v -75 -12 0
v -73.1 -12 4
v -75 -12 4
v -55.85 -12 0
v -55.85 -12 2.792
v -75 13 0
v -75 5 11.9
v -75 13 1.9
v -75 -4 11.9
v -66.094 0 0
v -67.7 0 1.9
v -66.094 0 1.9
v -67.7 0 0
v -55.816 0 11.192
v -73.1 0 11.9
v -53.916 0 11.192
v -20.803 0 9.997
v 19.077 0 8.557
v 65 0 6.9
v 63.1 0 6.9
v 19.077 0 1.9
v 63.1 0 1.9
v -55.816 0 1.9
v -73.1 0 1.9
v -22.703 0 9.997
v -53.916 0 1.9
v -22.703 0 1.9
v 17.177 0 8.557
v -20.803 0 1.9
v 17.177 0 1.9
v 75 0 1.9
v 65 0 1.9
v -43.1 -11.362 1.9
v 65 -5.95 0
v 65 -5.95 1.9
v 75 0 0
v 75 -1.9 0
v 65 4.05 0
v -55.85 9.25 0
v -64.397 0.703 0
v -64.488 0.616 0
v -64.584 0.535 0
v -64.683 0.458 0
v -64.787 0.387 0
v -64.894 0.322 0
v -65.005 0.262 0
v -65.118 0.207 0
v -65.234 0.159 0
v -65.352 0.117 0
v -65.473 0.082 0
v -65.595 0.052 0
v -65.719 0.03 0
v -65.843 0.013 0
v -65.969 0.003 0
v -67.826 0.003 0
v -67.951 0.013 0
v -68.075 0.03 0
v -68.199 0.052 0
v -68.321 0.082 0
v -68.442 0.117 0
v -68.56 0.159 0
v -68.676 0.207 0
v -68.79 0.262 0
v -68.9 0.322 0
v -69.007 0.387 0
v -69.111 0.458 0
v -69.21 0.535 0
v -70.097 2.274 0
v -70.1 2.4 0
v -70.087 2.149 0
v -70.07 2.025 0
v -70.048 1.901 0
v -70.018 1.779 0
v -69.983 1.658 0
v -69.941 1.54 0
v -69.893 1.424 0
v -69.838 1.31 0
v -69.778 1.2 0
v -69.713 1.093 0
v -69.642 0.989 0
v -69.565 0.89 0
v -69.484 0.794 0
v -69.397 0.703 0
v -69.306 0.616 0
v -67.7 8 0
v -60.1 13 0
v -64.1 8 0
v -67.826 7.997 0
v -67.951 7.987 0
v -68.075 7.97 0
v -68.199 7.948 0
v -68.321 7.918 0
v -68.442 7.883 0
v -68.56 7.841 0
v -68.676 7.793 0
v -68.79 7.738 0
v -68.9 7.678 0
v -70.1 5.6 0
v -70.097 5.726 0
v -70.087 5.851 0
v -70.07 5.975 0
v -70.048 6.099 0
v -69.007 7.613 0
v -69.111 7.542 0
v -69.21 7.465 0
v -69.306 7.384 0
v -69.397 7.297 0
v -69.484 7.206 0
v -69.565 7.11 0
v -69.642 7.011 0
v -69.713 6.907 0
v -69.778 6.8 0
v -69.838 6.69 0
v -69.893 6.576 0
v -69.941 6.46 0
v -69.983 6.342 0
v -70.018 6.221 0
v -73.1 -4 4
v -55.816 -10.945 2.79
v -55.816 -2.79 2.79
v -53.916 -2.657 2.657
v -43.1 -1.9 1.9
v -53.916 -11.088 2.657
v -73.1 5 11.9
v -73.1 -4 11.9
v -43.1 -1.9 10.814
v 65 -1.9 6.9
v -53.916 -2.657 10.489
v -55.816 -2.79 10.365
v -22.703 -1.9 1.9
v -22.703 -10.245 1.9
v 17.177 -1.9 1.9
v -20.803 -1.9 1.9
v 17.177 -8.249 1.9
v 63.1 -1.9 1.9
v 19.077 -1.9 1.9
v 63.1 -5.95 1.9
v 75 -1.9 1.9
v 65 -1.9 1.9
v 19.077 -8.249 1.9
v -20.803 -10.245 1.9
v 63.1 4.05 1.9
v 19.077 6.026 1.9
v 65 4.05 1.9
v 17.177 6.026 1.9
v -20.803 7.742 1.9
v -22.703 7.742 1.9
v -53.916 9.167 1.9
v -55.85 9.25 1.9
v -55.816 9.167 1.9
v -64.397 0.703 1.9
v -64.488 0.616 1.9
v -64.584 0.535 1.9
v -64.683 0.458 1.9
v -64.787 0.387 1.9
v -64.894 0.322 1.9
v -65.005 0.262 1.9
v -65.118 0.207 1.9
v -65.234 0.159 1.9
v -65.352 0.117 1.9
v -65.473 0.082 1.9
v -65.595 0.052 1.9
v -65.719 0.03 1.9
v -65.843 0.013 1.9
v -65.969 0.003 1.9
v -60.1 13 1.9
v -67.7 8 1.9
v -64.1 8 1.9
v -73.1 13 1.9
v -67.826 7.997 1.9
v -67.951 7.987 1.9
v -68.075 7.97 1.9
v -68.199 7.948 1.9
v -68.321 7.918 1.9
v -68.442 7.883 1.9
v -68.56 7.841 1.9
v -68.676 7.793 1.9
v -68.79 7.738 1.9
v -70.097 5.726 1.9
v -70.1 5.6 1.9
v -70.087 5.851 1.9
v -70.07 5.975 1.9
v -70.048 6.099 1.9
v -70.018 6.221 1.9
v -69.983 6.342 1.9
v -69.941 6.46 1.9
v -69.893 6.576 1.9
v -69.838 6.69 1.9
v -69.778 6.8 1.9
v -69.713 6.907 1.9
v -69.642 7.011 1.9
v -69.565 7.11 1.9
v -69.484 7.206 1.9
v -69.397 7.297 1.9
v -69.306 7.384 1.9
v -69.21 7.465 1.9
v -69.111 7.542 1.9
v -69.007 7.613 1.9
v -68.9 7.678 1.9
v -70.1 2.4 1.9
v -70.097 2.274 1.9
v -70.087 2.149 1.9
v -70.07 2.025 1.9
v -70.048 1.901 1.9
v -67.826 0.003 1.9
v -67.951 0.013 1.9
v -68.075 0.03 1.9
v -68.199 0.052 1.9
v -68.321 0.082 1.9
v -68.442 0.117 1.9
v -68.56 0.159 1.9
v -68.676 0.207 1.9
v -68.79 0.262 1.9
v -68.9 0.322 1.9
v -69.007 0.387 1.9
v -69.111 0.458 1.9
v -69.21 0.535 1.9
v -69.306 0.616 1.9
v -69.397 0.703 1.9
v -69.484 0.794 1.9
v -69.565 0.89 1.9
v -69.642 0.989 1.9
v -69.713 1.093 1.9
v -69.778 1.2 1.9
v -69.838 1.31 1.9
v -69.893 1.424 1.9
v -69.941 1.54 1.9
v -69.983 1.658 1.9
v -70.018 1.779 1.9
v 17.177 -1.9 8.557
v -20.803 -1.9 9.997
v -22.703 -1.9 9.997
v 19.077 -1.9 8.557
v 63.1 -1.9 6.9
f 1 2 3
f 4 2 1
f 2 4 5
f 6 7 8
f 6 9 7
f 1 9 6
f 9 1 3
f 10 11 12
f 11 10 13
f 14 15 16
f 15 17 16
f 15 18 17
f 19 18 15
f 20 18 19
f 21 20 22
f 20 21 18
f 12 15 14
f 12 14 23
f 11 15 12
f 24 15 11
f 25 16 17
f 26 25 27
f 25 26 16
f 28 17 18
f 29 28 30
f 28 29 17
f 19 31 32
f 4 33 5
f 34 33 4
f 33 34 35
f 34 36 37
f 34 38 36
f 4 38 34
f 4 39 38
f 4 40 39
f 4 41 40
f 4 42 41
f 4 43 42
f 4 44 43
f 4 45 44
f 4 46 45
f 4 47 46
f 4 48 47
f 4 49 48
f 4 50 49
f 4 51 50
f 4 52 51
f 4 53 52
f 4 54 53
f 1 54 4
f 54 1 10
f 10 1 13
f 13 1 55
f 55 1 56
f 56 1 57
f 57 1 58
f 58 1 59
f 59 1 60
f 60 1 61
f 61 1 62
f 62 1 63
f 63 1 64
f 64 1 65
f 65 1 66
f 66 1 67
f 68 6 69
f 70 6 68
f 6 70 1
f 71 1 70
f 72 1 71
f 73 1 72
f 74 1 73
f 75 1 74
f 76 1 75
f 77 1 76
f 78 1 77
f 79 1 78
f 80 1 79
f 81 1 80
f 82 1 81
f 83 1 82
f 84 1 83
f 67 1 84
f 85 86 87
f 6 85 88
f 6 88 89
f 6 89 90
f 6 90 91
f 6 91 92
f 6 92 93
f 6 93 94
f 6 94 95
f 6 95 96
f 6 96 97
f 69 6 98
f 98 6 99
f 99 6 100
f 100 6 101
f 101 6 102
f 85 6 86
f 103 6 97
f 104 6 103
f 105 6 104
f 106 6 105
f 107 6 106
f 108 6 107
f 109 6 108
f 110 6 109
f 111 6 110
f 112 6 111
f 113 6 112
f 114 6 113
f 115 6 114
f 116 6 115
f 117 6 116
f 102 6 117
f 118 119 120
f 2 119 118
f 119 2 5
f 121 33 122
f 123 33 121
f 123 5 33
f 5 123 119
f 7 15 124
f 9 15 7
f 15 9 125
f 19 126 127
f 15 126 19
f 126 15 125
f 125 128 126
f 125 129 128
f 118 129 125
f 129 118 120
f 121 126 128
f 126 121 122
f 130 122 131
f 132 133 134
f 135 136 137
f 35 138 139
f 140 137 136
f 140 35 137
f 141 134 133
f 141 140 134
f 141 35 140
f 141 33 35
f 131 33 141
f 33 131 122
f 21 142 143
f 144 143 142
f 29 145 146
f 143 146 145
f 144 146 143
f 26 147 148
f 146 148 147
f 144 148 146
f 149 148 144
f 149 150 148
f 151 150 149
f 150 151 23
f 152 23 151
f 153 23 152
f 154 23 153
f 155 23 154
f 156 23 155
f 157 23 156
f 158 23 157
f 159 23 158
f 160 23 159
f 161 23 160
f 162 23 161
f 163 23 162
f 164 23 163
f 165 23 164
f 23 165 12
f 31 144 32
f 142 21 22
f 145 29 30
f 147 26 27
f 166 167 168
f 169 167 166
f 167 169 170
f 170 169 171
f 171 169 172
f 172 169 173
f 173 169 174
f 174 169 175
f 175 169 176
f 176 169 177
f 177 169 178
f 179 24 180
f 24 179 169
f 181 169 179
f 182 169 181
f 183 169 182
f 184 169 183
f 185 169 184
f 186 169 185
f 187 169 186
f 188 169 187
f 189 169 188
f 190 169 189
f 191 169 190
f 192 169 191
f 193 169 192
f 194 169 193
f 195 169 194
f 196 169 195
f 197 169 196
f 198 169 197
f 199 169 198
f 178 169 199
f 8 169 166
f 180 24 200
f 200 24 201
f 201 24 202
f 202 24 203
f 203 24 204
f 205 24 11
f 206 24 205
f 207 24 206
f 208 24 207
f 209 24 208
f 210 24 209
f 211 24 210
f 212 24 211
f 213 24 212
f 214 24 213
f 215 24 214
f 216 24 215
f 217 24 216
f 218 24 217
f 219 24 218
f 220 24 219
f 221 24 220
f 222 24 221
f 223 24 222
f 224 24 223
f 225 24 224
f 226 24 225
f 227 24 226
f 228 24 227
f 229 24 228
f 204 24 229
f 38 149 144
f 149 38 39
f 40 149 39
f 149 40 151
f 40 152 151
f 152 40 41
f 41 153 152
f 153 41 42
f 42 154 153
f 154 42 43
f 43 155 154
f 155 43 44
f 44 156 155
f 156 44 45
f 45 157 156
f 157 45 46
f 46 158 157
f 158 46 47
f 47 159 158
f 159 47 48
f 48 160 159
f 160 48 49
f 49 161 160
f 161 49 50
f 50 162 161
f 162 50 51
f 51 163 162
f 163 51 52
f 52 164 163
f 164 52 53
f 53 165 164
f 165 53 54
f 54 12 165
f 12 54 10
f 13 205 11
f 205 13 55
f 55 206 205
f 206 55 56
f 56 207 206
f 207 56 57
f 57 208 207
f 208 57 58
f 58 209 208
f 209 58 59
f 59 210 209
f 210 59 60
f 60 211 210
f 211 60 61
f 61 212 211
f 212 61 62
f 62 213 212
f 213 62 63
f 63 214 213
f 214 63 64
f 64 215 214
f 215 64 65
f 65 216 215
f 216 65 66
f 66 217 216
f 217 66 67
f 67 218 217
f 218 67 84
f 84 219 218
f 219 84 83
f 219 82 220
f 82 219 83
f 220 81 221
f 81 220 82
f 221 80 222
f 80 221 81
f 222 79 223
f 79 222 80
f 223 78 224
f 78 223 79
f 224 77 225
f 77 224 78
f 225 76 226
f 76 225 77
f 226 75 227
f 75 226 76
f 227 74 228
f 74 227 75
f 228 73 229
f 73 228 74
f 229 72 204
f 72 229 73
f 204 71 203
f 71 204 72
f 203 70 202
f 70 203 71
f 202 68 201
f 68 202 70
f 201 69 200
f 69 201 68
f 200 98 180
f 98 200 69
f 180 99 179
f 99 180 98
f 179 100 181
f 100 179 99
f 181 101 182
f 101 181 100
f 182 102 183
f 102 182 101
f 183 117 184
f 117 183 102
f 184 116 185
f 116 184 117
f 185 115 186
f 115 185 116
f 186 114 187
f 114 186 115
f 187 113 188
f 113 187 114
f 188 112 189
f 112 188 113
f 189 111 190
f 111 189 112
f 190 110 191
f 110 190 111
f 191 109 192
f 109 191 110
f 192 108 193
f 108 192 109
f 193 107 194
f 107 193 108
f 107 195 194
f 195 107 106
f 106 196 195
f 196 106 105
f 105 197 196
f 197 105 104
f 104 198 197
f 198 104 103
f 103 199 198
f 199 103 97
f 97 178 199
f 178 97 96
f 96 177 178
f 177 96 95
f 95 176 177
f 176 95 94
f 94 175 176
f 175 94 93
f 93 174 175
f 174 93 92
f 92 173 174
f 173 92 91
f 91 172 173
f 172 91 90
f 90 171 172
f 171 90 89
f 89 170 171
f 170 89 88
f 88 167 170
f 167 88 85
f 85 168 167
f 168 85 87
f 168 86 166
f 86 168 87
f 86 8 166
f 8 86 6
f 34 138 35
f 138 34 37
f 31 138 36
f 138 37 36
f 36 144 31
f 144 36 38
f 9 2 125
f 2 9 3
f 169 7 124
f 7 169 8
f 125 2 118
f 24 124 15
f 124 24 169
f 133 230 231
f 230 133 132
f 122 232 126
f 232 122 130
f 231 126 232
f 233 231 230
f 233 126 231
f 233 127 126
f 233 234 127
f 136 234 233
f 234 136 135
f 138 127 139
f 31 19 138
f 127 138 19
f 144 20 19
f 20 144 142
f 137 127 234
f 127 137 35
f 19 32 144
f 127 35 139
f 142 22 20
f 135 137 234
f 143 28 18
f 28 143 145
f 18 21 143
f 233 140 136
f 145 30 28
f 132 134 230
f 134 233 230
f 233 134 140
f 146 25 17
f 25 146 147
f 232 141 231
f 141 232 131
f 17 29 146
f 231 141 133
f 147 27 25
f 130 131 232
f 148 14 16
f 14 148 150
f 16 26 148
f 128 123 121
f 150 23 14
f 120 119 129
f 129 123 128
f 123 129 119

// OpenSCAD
length         = 150.0; // [50.0:10.0:300.0]
baseThickness  =   1.9; // [ 1.0: 0.1:  5.0]
baseFlare      =   4.0; // [ 1.0: 0.1: 10.0]
spineThickness = baseThickness;
spineFlare     = baseFlare;
spineDepth     =  10.0; // [ 3.0: 0.5: 20.0]
ribThickness   = spineThickness;
flareLength    =  30.0; // [ 5.0: 1.0:100.0]
headThickness  = ribThickness;
tipWidth       =  10.0; // [ 5.0: 1.0: 30.0]
tipLength      = tipWidth;
tipDepth       = tipWidth/2.0;
headWidth      =  25.0; // [15.0: 1.0: 50.0]
headDepth      = spineDepth;
hookWidth      =   5.0; // [ 3.0: 0.5: 10.0] 
hookHole       =   8.0; // [ 3.0: 0.5: 10.0] 
hookLength     =  10.0; // [ 3.0: 0.5: 15.0] 
hookSlope      =   4.0; // [ 0.0: 0.1: 10.0] 
hookBack       =   8.0; // [ 3.0: 0.5: 20.0] 
hookTop        =   3.0; // [ 0.0: 0.1: 10.0] 
cornerRadius   =   2.4; // [ 0.1: 0.1:  5.0]
hookSide       = hookWidth+hookHole;
headSide       = headWidth-(hookSide+spineFlare);
hookTaper      = hookHole+hookWidth/4.0;
taperEndLength = length-(headThickness+hookBack+hookTaper);
tipSide        = (tipWidth-spineThickness)/2.0;
facets         = 120;

$fn=facets;

stakeOnPlate();


module stakeOnPlate()
{ translate( [length/2,0,0] )
    rotate( [0,0,90] )
      stake();
}

module stake()
{ basePlate();
  baseRamp();
  head();
  spine();
  spineRamp();
  rib(0.00);
  rib(0.38);
  rib(0.71);
  rib(0.984);
}

module basePlate()
{ linear_extrude( baseThickness ) 
    fillet(r=cornerRadius)
      polygon(points=[[                          0,                                            0 ],
                      [           -spineThickness ,                                            0 ],
                      [ -( tipSide+spineThickness), tipLength                                    ],
                      [ -(headSide+spineFlare    ), taperEndLength                               ],
                      [ -(headSide+spineFlare    ),    length                                    ],
                      [   hookHole+hookWidth      ,    length                                    ],
                      [   hookHole+hookWidth      ,    length- headThickness                     ],
                      [   hookHole+hookWidth      ,    length-(headThickness+hookTop+hookLength) ],
                      [   hookHole                ,    length-(headThickness+hookTop+hookLength-hookSlope) ],
                      [   hookHole                ,    length-(headThickness+hookTop)            ],
                      [                          0,    length-(headThickness+hookTop)            ],
                      [                          0,    length-(headThickness+hookBack)           ],
                      [   hookTaper               , taperEndLength                               ],
                      [    tipSide                , tipLength                                    ]],
              paths =[[0,1,2,3,4,5,6,7,8,9,10,11,12,13,0]] );
}

module baseRamp()
{ difference()
    { linear_extrude( baseFlare ) 
        polygon(points=[[                          0,                                            0 ],
                        [           -spineThickness ,                                            0 ],
                        [ -( tipSide+spineThickness), tipLength                                    ],
                        [ -(headSide+spineFlare    ), taperEndLength                               ],
                        [ -(headSide+spineFlare    ),    length                                    ],
                        [                          0,    length                                    ]],
                paths =[[0,1,2,3,4,5,0]] );
        
      rotate( [0,-90,0] )
        linear_extrude( headSide+spineFlare+1 ) 
          polygon(points=[[                      -1,                               -1 ],
                          [                      -1, length-headThickness-flareLength ],
                          [           baseThickness, length-headThickness-flareLength ],
                          [           baseFlare    , length-headThickness             ],
                          [           baseFlare    , length+1                         ],
                          [           baseFlare  +1, length+1                         ],
                          [           baseFlare  +1,                               -1 ]],
                  paths =[[0,1,2,3,4,5,6,0]] );
    }
}

module head()
{ translate( [0,length,0] )
    rotate( [90,0,0] )
      linear_extrude( headThickness ) 
        polygon(points=[[ -(headSide+spineFlare),                        0 ],
                        [ -(headSide+spineFlare), baseFlare                ],
                        [           -spineFlare , baseThickness+spineDepth ],
                        [   hookSide-headSide   , baseThickness+spineDepth ],
                        [   hookSide            , baseThickness            ],
                        [   hookSide            ,                        0 ]],
                paths =[[0,1,2,3,4,5,0]] );
}

module spine()
{ rotate( [0,-90,0] )
    linear_extrude( spineThickness ) 
      polygon(points=[[                       0,                        0 ],
                      [ baseThickness          ,                        0 ],
                      [ baseThickness+ tipDepth, tipLength                ],
                      [ baseThickness+headDepth,    length- headThickness ],
                      [ baseThickness+headDepth,    length                ],
                      [                       0,    length                ]],
              paths =[[0,1,2,3,4,5,0]] );
}

module spineRamp()
{ difference()
    { rotate( [0,-90,0] )
        linear_extrude( spineFlare ) 
          polygon(points=[[                       0,                        0 ],
                          [ baseThickness          ,                        0 ],
                          [ baseThickness+ tipDepth, tipLength                ],
                          [ baseThickness+headDepth,    length- headThickness ],
                          [ baseThickness+headDepth,    length                ],
                          [                       0,    length                ]],
                  paths =[[0,1,2,3,4,5,0]] );
        
        linear_extrude( headDepth+baseThickness+1 ) 
          polygon(points=[[               1,                               -1 ],
                          [               1, length-headThickness-flareLength ],
                          [ -spineThickness, length-headThickness-flareLength ],
                          [     -spineFlare, length-headThickness             ],
                          [     -spineFlare, length+1                         ],
                          [   -1-spineFlare, length+1                         ],
                          [   -1-spineFlare,                               -1 ]],
                  paths =[[0,1,2,3,4,5,6,0]] );
    }
}

module rib( f=0.5 )
{ f2 = f * taperEndLength / length;
    lengthRange = taperEndLength-tipLength;
      sideRange = headSide+spineFlare-spineThickness-tipSide;
  holeSideRange = hookTaper-tipSide;
     depthRange = headDepth-tipDepth;
  translate( [0,tipLength+ribThickness+f*lengthRange,0] )
    rotate( [90,0,0] )
      linear_extrude( ribThickness ) 
        polygon(points=[[ -(tipSide+sideRange*f+spineThickness),                                   0 ],
                        [ -(tipSide+sideRange*f+spineThickness),baseThickness                        ],
                        [                      -spineThickness ,baseThickness+tipDepth+depthRange*f2 ],
                        [                      -              0,baseThickness+tipDepth+depthRange*f2 ],
                        [   tipSide+holeSideRange*f            ,baseThickness                        ],
                        [   tipSide+holeSideRange*f            ,                                   0 ]],
                paths =[[0,1,2,3,4,5,0]] );
}


// Copyright (c) 2013 Oskar Linde. All rights reserved.
// License: BSD
//
// This library contains basic 2D morphology operations
//
// outset(d=1)            - creates a polygon at an offset d outside a 2D shape
// inset(d=1)             - creates a polygon at an offset d inside a 2D shape
// fillet(r=1)            - adds fillets of radius r to all concave corners of a 2D shape
// rounding(r=1)          - adds rounding to all convex corners of a 2D shape
// shell(d,center=false)  - makes a shell of width d along the edge of a 2D shape
//                        - positive values of d places the shell on the outside
//                        - negative values of d places the shell on the inside
//                        - center=true and positive d places the shell centered on the edge

module outset(d=1) {
	// Bug workaround for older OpenSCAD versions
	if (version_num() < 20130424) render() outset_extruded(d) children();
	else minkowski() {
		circle(r=d);
		children();
	}
}

module outset_extruded(d=1) {
   projection(cut=true) minkowski() {
        cylinder(r=d);
        linear_extrude(center=true) children();
   }
}

module inset(d=1) {
	 render() inverse() outset(d=d) inverse() children();
}

module fillet(r=1) {
	inset(d=r) render() outset(d=r) children();
}

module rounding(r=1) {
	outset(d=r) inset(d=r) children();
}

module shell(d,center=false) {
	if (center && d > 0) {
		difference() {
			outset(d=d/2) children();
			inset(d=d/2) children();
		}
	}
	if (!center && d > 0) {
		difference() {
			outset(d=d) children();
			children();
		}
	}
	if (!center && d < 0) {
		difference() {
			children();
			inset(d=-d) children();
		}
	}
	if (d == 0) children();
}


// Below are for internal use only

module inverse() {
	difference() {
		square(1e5,center=true);
		children();
	}
}
